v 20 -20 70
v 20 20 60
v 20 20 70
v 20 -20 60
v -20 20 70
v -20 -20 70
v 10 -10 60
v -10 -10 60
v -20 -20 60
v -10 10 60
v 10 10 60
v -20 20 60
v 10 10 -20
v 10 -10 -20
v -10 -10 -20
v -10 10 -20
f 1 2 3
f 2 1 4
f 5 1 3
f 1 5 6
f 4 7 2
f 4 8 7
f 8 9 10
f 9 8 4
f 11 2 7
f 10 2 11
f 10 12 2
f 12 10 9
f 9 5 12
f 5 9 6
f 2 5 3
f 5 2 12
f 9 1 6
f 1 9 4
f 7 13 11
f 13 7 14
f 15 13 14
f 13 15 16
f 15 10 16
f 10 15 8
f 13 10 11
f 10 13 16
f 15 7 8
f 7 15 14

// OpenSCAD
intersection()  {
translate([-20.0,-20.0,-20.0])  cube([40.0,40.0,90.0]);
union()  {
translate([0.0,0.0,60.0])  translate([-20.0,-20.0,0.0])  cube([40.0,40.0,10.0]);
translate([0.0,0.0,-20.0])  translate([-10.0,-10.0,0.0])  cube([20.0,20.0,80.0]);
}
}
